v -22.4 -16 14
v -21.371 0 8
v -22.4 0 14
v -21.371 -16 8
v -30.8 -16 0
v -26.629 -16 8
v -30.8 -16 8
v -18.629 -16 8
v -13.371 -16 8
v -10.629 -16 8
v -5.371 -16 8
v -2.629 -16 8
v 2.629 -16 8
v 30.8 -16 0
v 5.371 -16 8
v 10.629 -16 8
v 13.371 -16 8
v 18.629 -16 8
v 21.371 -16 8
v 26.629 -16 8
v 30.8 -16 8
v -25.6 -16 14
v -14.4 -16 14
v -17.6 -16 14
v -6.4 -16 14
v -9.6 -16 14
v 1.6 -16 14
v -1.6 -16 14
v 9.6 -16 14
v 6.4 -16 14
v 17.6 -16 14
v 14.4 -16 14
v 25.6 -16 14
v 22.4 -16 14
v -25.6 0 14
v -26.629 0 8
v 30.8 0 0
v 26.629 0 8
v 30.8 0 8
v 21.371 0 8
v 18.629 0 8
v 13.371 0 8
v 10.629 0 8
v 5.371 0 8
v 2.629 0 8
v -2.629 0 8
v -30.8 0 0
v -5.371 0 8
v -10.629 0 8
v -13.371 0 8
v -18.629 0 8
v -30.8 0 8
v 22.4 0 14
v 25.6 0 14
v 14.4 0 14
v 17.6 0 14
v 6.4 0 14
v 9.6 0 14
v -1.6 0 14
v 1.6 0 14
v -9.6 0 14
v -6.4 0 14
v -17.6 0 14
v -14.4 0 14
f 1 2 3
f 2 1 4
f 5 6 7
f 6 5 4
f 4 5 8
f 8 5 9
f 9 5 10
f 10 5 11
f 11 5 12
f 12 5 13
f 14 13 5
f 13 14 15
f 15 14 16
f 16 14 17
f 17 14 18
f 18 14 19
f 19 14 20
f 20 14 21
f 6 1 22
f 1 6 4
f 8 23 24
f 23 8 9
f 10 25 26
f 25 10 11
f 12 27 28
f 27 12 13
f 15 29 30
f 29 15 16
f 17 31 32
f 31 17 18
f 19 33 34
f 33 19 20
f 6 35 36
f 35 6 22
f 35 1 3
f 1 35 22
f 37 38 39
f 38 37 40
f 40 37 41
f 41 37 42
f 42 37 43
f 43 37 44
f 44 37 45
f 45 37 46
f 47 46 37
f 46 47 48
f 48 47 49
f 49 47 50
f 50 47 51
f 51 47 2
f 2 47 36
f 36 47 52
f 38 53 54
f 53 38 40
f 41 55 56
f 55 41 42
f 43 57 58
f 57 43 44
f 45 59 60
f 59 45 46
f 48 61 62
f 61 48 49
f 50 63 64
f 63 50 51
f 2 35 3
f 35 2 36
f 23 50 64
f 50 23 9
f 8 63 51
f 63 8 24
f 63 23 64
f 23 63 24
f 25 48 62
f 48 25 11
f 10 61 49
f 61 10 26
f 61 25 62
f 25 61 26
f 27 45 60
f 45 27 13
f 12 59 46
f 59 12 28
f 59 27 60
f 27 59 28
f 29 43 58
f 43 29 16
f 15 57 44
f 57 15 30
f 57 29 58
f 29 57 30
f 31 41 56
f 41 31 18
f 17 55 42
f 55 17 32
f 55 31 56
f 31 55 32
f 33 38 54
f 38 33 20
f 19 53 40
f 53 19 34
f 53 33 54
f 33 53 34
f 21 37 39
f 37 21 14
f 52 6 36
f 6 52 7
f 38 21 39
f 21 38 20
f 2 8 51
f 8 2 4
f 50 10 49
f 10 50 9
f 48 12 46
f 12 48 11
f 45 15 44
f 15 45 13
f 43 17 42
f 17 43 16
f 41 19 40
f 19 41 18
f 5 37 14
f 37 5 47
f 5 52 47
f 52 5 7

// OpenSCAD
$fn = 32;

// ----------------------------------------------------------------------
// Toothed rack, 7 teeth
// 8 mm pitch, 6 mm teeth
// ----------------------------------------------------------------------

// --- parameters (mm) ---
bar_w = 16;     // bar width (Y)
bar_h = 8;      // bar height (Z)
teeth = 7;      // number of teeth
pitch = 8;      // tooth pitch
tooth_h = 6;    // tooth height above the bar
root_w = 5.6;   // tooth width at the root
crest_w = 3.2;  // tooth width at the crest

// --- derived feature positions (mm) ---
span = (teeth - 1) * pitch;  // = 48   distance between the outer teeth
bar_l = span + root_w + 8;   // = 61.6   bar length: teeth plus 4 mm at each end
tooth_x = -span / 2;         // = -24   X of the first tooth
height = bar_h + tooth_h;    // = 14   overall height
feature_centers = [
  [tooth_x + 0 * pitch, -bar_w / 2],
  [tooth_x + 1 * pitch, -bar_w / 2],
  [tooth_x + 2 * pitch, -bar_w / 2],
  [tooth_x + 3 * pitch, -bar_w / 2],
  [tooth_x + 4 * pitch, -bar_w / 2],
  [tooth_x + 5 * pitch, -bar_w / 2],
  [tooth_x + 6 * pitch, -bar_w / 2]
];   // tooth centre line, drives the tooth loop

// bar with a rack of teeth, one extruded trapezoium per centre
module rack_tooth() {
  linear_extrude(height = bar_w)
    polygon(points = [
      [0, 0],
      [root_w, 0],
      [root_w / 2 + crest_w / 2, tooth_h + 1],
      [root_w / 2 - crest_w / 2, tooth_h + 1]
    ]);
}

union() {
  translate([-bar_l / 2, -bar_w, 0]) cube([bar_l, bar_w, bar_h]);
  for (centre = feature_centers)
    translate([centre[0] - root_w / 2, 0, bar_h - 1]) rotate([90, 0, 0]) rack_tooth();
}
